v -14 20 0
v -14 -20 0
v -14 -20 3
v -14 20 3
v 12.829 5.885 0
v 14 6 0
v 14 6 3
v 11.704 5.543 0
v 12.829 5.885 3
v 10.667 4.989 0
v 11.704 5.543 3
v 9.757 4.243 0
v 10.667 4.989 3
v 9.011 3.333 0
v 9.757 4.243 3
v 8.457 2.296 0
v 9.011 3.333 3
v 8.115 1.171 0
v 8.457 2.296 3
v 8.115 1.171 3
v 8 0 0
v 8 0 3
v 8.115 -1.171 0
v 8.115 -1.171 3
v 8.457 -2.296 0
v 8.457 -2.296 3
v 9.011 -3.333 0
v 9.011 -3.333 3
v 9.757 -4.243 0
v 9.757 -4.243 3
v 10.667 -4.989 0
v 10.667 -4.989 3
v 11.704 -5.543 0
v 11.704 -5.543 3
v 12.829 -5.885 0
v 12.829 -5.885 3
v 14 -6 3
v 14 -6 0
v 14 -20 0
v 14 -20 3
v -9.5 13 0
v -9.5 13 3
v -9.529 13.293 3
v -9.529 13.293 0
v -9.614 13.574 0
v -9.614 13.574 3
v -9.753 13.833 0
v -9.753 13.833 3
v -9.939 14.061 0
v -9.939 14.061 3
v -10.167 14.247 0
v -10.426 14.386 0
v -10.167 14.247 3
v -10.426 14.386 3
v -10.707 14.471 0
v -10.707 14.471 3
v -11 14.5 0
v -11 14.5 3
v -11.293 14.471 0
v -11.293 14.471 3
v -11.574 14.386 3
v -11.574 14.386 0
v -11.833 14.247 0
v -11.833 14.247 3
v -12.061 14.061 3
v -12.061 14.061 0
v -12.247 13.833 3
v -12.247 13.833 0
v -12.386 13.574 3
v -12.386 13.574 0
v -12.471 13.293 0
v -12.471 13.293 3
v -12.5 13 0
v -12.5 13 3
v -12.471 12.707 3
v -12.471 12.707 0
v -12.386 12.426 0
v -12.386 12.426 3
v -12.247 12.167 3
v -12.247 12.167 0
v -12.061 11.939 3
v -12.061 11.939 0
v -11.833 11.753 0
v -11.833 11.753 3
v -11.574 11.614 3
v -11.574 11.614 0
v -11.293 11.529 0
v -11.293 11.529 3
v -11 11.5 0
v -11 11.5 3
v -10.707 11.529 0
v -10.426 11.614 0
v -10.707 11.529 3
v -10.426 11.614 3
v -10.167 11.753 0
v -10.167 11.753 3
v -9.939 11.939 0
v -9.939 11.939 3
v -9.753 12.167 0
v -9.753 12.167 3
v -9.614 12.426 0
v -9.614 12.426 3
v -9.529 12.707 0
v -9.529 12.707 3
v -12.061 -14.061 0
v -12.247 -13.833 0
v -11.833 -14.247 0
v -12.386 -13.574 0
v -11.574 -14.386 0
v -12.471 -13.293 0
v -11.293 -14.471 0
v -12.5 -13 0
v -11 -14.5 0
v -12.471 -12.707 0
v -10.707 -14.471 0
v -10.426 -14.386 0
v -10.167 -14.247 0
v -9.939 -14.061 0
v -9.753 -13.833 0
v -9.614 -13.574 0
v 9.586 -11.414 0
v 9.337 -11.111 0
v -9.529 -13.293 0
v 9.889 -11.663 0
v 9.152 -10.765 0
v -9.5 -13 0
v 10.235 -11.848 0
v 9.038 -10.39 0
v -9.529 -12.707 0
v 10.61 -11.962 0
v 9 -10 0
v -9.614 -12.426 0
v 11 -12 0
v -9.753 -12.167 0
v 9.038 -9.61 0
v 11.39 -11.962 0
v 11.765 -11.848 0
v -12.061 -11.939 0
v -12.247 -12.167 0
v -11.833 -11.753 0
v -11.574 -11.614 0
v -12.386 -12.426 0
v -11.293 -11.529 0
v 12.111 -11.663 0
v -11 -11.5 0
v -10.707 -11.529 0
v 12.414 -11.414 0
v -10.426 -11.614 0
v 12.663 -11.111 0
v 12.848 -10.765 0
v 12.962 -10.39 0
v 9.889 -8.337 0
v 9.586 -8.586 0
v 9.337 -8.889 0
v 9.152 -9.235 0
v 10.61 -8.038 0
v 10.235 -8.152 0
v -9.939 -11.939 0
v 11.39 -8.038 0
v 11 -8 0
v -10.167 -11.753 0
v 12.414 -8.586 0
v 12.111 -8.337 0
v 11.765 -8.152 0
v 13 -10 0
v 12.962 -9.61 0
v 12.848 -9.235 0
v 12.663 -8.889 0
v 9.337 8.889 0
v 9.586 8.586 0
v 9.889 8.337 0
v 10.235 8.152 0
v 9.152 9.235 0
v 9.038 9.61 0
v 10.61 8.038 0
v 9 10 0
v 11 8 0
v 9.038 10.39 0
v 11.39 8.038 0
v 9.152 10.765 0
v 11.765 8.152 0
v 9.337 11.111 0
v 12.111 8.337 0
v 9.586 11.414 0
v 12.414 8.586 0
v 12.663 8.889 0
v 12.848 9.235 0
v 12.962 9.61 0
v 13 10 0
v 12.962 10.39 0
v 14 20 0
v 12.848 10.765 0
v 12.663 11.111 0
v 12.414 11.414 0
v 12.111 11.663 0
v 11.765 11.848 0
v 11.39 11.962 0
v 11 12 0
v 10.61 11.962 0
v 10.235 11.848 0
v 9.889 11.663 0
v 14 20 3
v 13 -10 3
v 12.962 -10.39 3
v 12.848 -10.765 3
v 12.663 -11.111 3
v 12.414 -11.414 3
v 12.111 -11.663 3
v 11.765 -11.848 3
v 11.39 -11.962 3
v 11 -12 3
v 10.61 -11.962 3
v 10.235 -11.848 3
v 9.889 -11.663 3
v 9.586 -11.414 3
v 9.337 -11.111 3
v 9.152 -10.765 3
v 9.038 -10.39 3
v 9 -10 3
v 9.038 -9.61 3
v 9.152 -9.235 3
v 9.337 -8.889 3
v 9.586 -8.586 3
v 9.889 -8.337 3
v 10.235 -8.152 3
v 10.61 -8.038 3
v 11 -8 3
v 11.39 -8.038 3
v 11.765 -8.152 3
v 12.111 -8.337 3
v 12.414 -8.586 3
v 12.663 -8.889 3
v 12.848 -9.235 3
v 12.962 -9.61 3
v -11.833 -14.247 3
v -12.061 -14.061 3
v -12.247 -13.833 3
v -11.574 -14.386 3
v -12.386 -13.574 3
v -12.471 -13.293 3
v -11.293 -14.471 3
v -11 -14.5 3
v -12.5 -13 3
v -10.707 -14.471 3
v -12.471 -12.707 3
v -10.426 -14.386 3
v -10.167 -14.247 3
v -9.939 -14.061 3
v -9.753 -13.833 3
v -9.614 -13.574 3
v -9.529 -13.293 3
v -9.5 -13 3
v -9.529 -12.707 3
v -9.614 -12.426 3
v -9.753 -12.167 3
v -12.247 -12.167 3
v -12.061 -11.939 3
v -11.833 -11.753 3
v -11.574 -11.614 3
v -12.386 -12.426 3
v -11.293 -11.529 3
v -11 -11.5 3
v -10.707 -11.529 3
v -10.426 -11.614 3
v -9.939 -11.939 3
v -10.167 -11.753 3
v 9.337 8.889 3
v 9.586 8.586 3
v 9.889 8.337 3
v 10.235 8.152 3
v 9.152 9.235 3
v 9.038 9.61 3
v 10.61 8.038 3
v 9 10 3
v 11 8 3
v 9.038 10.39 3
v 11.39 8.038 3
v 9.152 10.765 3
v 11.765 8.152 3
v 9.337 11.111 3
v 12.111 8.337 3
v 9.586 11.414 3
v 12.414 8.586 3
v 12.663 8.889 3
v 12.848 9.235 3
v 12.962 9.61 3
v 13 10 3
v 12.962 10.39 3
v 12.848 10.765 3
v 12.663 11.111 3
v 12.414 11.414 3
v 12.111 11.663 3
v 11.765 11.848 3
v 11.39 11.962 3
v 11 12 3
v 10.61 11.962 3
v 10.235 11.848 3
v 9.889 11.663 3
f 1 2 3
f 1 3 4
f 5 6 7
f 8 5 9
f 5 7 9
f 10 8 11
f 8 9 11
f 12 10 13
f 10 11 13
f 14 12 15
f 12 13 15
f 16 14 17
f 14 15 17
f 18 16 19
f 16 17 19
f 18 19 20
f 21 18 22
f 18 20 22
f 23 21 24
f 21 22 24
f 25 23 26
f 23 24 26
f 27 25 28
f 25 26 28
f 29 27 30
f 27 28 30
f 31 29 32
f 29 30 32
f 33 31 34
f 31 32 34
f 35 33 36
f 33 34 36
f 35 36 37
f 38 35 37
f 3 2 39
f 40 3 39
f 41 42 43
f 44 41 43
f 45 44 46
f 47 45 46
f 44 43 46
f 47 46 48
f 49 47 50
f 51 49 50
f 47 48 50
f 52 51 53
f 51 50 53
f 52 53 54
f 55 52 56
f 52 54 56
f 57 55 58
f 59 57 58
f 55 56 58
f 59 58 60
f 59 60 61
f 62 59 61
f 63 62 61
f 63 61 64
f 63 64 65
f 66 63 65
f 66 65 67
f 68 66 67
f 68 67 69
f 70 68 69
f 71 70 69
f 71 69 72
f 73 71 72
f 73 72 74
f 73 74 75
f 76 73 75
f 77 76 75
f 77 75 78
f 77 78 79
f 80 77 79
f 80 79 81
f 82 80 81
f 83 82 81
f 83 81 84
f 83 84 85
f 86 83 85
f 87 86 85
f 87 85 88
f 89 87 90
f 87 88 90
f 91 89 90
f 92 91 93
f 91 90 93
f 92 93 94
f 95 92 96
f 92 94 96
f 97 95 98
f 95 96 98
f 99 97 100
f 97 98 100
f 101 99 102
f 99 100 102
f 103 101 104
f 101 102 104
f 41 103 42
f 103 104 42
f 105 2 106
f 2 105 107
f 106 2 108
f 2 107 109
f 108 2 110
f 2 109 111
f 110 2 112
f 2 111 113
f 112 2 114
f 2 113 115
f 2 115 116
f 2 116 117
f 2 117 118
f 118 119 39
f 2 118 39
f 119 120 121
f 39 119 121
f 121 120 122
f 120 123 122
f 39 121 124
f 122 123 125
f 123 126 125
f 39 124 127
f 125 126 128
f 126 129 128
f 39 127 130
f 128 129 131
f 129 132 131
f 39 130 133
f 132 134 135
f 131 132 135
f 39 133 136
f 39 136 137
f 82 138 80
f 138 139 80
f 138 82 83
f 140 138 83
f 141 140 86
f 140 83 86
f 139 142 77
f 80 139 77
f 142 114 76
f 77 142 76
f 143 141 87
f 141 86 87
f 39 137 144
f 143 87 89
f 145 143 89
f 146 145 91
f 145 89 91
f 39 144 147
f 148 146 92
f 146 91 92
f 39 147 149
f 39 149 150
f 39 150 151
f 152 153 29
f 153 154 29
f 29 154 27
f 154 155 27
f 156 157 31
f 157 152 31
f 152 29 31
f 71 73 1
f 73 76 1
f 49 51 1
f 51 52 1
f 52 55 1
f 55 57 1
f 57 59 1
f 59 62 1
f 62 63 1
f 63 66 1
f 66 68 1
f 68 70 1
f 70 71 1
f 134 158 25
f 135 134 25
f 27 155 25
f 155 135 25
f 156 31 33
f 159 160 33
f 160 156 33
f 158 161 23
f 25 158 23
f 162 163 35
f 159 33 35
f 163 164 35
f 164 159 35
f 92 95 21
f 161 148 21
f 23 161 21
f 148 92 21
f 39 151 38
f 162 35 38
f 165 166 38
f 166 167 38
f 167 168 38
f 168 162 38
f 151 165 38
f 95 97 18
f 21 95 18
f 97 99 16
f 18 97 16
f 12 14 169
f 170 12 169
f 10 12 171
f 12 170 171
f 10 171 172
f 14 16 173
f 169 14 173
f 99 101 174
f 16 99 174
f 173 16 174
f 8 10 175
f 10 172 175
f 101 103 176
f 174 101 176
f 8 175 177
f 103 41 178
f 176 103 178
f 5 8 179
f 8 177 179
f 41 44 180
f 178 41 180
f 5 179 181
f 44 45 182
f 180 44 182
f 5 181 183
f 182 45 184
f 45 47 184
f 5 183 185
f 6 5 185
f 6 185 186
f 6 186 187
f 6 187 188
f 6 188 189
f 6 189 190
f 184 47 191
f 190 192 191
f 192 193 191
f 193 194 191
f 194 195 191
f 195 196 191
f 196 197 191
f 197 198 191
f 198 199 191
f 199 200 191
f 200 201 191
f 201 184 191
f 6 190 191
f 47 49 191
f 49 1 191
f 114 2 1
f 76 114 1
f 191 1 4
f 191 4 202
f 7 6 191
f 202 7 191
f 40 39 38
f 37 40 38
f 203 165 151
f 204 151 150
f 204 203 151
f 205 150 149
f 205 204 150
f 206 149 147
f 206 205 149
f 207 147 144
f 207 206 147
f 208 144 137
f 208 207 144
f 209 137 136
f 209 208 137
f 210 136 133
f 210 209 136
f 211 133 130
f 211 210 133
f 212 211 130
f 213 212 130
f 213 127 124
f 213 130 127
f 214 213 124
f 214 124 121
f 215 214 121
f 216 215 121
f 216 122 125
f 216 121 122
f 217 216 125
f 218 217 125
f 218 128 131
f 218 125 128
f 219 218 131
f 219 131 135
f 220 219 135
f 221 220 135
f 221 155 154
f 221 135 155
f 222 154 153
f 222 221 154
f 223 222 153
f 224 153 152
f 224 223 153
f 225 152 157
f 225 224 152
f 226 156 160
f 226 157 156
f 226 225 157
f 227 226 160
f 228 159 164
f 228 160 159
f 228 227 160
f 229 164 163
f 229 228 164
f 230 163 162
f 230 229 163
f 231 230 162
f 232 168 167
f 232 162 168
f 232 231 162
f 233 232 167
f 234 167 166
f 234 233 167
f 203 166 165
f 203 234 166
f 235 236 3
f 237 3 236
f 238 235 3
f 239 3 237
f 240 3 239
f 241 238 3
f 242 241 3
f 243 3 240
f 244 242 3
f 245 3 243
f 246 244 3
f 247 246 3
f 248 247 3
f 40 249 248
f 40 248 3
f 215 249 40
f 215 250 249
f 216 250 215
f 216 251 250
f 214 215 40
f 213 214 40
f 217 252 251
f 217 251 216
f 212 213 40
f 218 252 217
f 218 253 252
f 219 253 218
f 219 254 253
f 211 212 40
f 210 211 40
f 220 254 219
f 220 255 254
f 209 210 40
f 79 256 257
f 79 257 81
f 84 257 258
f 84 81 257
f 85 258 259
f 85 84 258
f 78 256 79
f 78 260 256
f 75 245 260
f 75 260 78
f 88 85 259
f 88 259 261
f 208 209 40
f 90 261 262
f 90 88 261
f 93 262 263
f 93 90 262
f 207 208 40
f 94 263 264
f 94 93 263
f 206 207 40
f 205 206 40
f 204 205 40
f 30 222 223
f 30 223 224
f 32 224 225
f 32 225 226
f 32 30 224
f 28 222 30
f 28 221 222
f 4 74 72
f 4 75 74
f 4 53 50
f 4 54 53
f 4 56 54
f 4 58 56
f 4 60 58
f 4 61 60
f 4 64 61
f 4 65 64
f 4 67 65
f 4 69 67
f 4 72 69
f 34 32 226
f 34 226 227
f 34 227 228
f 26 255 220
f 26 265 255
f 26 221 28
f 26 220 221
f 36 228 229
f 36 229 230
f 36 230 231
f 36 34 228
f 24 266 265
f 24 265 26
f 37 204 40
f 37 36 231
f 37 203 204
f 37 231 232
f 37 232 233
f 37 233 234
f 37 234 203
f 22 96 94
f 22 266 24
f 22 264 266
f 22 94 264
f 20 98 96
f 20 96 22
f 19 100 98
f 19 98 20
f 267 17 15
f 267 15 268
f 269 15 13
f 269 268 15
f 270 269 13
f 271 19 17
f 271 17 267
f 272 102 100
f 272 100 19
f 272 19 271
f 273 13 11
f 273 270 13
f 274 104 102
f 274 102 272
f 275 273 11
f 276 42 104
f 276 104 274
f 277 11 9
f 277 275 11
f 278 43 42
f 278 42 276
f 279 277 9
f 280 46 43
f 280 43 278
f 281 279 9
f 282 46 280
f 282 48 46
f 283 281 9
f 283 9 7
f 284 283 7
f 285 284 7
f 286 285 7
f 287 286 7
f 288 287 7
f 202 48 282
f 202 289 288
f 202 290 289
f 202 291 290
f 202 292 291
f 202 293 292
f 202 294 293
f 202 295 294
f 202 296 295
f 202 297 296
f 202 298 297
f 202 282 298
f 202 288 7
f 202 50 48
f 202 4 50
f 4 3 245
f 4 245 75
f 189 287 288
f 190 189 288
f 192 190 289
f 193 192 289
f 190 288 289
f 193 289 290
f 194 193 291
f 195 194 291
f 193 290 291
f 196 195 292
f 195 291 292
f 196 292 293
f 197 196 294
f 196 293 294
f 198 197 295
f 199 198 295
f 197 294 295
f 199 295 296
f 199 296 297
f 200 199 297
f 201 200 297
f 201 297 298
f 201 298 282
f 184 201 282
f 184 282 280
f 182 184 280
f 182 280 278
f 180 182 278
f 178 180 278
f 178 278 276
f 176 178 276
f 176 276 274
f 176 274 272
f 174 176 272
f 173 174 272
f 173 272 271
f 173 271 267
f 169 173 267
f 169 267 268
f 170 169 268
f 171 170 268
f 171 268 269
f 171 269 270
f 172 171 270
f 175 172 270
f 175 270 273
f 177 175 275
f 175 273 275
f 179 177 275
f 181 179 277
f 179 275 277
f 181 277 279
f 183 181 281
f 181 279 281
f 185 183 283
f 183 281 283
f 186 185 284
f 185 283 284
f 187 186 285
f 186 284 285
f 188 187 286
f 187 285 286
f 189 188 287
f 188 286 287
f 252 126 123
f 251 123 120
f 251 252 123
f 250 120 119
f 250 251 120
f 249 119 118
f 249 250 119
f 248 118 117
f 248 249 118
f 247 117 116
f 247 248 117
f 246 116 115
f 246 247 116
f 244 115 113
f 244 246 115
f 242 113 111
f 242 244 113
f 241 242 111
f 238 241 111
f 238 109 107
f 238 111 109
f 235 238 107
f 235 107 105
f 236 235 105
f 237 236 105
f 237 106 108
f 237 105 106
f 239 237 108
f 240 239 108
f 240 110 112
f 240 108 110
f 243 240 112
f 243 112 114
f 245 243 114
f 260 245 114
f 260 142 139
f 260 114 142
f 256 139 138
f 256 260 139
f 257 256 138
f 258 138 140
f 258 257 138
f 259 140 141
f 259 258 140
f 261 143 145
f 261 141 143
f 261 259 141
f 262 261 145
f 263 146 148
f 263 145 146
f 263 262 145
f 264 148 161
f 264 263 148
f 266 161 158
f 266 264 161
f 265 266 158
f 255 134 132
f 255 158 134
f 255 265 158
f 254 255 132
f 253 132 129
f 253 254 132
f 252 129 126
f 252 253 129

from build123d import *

# Parameters (mm, degrees)
ESQUISSE1_W             = 28
ESQUISSE1_H             = 40
BOSS_EXTRU_1_DEPTH      = 3
ESQUISSE7_R             = 1.5
ENL_V_MAT_EXTRU_6_DEPTH = 5
ESQUISSE8_R             = 2
ENL_V_MAT_EXTRU_7_DEPTH = 10
ESQUISSE9_R             = 6
ENL_V_MAT_EXTRU_8_DEPTH = 10


with BuildPart() as part:
    # Esquisse1 → Boss.-Extru.1 (new body)
    with BuildSketch(Plane.XY):
        Rectangle(ESQUISSE1_W, ESQUISSE1_H)
    extrude(amount=BOSS_EXTRU_1_DEPTH)

    # Esquisse7 → Enlèv. mat.-Extru.6 (cut)
    with BuildSketch(Plane.XY.offset(3)):
        with Locations((-11, 13)):
            Circle(ESQUISSE7_R)
    enl_v_mat_extru_6 = extrude(amount=-ENL_V_MAT_EXTRU_6_DEPTH, mode=Mode.SUBTRACT)

    # Symétrie2: Enlèv. mat.-Extru.6 across plane
    add(enl_v_mat_extru_6.mirror(Plane.ZX), mode=Mode.SUBTRACT)

    # Esquisse8 → Enlèv. mat.-Extru.7 (cut)
    with BuildSketch(Plane.XY.offset(3)):
        with Locations((11, 10)):
            Circle(ESQUISSE8_R)
    enl_v_mat_extru_7 = extrude(amount=-ENL_V_MAT_EXTRU_7_DEPTH, mode=Mode.SUBTRACT)

    # Symétrie3: Enlèv. mat.-Extru.7 across plane
    add(enl_v_mat_extru_7.mirror(Plane.ZX), mode=Mode.SUBTRACT)

    # Esquisse9 → Enlèv. mat.-Extru.8 (cut)
    with BuildSketch(Plane.XY.offset(3)):
        with Locations((14, 0)):
            Circle(ESQUISSE9_R)
    extrude(amount=-ENL_V_MAT_EXTRU_8_DEPTH, mode=Mode.SUBTRACT)


solid = part.part
